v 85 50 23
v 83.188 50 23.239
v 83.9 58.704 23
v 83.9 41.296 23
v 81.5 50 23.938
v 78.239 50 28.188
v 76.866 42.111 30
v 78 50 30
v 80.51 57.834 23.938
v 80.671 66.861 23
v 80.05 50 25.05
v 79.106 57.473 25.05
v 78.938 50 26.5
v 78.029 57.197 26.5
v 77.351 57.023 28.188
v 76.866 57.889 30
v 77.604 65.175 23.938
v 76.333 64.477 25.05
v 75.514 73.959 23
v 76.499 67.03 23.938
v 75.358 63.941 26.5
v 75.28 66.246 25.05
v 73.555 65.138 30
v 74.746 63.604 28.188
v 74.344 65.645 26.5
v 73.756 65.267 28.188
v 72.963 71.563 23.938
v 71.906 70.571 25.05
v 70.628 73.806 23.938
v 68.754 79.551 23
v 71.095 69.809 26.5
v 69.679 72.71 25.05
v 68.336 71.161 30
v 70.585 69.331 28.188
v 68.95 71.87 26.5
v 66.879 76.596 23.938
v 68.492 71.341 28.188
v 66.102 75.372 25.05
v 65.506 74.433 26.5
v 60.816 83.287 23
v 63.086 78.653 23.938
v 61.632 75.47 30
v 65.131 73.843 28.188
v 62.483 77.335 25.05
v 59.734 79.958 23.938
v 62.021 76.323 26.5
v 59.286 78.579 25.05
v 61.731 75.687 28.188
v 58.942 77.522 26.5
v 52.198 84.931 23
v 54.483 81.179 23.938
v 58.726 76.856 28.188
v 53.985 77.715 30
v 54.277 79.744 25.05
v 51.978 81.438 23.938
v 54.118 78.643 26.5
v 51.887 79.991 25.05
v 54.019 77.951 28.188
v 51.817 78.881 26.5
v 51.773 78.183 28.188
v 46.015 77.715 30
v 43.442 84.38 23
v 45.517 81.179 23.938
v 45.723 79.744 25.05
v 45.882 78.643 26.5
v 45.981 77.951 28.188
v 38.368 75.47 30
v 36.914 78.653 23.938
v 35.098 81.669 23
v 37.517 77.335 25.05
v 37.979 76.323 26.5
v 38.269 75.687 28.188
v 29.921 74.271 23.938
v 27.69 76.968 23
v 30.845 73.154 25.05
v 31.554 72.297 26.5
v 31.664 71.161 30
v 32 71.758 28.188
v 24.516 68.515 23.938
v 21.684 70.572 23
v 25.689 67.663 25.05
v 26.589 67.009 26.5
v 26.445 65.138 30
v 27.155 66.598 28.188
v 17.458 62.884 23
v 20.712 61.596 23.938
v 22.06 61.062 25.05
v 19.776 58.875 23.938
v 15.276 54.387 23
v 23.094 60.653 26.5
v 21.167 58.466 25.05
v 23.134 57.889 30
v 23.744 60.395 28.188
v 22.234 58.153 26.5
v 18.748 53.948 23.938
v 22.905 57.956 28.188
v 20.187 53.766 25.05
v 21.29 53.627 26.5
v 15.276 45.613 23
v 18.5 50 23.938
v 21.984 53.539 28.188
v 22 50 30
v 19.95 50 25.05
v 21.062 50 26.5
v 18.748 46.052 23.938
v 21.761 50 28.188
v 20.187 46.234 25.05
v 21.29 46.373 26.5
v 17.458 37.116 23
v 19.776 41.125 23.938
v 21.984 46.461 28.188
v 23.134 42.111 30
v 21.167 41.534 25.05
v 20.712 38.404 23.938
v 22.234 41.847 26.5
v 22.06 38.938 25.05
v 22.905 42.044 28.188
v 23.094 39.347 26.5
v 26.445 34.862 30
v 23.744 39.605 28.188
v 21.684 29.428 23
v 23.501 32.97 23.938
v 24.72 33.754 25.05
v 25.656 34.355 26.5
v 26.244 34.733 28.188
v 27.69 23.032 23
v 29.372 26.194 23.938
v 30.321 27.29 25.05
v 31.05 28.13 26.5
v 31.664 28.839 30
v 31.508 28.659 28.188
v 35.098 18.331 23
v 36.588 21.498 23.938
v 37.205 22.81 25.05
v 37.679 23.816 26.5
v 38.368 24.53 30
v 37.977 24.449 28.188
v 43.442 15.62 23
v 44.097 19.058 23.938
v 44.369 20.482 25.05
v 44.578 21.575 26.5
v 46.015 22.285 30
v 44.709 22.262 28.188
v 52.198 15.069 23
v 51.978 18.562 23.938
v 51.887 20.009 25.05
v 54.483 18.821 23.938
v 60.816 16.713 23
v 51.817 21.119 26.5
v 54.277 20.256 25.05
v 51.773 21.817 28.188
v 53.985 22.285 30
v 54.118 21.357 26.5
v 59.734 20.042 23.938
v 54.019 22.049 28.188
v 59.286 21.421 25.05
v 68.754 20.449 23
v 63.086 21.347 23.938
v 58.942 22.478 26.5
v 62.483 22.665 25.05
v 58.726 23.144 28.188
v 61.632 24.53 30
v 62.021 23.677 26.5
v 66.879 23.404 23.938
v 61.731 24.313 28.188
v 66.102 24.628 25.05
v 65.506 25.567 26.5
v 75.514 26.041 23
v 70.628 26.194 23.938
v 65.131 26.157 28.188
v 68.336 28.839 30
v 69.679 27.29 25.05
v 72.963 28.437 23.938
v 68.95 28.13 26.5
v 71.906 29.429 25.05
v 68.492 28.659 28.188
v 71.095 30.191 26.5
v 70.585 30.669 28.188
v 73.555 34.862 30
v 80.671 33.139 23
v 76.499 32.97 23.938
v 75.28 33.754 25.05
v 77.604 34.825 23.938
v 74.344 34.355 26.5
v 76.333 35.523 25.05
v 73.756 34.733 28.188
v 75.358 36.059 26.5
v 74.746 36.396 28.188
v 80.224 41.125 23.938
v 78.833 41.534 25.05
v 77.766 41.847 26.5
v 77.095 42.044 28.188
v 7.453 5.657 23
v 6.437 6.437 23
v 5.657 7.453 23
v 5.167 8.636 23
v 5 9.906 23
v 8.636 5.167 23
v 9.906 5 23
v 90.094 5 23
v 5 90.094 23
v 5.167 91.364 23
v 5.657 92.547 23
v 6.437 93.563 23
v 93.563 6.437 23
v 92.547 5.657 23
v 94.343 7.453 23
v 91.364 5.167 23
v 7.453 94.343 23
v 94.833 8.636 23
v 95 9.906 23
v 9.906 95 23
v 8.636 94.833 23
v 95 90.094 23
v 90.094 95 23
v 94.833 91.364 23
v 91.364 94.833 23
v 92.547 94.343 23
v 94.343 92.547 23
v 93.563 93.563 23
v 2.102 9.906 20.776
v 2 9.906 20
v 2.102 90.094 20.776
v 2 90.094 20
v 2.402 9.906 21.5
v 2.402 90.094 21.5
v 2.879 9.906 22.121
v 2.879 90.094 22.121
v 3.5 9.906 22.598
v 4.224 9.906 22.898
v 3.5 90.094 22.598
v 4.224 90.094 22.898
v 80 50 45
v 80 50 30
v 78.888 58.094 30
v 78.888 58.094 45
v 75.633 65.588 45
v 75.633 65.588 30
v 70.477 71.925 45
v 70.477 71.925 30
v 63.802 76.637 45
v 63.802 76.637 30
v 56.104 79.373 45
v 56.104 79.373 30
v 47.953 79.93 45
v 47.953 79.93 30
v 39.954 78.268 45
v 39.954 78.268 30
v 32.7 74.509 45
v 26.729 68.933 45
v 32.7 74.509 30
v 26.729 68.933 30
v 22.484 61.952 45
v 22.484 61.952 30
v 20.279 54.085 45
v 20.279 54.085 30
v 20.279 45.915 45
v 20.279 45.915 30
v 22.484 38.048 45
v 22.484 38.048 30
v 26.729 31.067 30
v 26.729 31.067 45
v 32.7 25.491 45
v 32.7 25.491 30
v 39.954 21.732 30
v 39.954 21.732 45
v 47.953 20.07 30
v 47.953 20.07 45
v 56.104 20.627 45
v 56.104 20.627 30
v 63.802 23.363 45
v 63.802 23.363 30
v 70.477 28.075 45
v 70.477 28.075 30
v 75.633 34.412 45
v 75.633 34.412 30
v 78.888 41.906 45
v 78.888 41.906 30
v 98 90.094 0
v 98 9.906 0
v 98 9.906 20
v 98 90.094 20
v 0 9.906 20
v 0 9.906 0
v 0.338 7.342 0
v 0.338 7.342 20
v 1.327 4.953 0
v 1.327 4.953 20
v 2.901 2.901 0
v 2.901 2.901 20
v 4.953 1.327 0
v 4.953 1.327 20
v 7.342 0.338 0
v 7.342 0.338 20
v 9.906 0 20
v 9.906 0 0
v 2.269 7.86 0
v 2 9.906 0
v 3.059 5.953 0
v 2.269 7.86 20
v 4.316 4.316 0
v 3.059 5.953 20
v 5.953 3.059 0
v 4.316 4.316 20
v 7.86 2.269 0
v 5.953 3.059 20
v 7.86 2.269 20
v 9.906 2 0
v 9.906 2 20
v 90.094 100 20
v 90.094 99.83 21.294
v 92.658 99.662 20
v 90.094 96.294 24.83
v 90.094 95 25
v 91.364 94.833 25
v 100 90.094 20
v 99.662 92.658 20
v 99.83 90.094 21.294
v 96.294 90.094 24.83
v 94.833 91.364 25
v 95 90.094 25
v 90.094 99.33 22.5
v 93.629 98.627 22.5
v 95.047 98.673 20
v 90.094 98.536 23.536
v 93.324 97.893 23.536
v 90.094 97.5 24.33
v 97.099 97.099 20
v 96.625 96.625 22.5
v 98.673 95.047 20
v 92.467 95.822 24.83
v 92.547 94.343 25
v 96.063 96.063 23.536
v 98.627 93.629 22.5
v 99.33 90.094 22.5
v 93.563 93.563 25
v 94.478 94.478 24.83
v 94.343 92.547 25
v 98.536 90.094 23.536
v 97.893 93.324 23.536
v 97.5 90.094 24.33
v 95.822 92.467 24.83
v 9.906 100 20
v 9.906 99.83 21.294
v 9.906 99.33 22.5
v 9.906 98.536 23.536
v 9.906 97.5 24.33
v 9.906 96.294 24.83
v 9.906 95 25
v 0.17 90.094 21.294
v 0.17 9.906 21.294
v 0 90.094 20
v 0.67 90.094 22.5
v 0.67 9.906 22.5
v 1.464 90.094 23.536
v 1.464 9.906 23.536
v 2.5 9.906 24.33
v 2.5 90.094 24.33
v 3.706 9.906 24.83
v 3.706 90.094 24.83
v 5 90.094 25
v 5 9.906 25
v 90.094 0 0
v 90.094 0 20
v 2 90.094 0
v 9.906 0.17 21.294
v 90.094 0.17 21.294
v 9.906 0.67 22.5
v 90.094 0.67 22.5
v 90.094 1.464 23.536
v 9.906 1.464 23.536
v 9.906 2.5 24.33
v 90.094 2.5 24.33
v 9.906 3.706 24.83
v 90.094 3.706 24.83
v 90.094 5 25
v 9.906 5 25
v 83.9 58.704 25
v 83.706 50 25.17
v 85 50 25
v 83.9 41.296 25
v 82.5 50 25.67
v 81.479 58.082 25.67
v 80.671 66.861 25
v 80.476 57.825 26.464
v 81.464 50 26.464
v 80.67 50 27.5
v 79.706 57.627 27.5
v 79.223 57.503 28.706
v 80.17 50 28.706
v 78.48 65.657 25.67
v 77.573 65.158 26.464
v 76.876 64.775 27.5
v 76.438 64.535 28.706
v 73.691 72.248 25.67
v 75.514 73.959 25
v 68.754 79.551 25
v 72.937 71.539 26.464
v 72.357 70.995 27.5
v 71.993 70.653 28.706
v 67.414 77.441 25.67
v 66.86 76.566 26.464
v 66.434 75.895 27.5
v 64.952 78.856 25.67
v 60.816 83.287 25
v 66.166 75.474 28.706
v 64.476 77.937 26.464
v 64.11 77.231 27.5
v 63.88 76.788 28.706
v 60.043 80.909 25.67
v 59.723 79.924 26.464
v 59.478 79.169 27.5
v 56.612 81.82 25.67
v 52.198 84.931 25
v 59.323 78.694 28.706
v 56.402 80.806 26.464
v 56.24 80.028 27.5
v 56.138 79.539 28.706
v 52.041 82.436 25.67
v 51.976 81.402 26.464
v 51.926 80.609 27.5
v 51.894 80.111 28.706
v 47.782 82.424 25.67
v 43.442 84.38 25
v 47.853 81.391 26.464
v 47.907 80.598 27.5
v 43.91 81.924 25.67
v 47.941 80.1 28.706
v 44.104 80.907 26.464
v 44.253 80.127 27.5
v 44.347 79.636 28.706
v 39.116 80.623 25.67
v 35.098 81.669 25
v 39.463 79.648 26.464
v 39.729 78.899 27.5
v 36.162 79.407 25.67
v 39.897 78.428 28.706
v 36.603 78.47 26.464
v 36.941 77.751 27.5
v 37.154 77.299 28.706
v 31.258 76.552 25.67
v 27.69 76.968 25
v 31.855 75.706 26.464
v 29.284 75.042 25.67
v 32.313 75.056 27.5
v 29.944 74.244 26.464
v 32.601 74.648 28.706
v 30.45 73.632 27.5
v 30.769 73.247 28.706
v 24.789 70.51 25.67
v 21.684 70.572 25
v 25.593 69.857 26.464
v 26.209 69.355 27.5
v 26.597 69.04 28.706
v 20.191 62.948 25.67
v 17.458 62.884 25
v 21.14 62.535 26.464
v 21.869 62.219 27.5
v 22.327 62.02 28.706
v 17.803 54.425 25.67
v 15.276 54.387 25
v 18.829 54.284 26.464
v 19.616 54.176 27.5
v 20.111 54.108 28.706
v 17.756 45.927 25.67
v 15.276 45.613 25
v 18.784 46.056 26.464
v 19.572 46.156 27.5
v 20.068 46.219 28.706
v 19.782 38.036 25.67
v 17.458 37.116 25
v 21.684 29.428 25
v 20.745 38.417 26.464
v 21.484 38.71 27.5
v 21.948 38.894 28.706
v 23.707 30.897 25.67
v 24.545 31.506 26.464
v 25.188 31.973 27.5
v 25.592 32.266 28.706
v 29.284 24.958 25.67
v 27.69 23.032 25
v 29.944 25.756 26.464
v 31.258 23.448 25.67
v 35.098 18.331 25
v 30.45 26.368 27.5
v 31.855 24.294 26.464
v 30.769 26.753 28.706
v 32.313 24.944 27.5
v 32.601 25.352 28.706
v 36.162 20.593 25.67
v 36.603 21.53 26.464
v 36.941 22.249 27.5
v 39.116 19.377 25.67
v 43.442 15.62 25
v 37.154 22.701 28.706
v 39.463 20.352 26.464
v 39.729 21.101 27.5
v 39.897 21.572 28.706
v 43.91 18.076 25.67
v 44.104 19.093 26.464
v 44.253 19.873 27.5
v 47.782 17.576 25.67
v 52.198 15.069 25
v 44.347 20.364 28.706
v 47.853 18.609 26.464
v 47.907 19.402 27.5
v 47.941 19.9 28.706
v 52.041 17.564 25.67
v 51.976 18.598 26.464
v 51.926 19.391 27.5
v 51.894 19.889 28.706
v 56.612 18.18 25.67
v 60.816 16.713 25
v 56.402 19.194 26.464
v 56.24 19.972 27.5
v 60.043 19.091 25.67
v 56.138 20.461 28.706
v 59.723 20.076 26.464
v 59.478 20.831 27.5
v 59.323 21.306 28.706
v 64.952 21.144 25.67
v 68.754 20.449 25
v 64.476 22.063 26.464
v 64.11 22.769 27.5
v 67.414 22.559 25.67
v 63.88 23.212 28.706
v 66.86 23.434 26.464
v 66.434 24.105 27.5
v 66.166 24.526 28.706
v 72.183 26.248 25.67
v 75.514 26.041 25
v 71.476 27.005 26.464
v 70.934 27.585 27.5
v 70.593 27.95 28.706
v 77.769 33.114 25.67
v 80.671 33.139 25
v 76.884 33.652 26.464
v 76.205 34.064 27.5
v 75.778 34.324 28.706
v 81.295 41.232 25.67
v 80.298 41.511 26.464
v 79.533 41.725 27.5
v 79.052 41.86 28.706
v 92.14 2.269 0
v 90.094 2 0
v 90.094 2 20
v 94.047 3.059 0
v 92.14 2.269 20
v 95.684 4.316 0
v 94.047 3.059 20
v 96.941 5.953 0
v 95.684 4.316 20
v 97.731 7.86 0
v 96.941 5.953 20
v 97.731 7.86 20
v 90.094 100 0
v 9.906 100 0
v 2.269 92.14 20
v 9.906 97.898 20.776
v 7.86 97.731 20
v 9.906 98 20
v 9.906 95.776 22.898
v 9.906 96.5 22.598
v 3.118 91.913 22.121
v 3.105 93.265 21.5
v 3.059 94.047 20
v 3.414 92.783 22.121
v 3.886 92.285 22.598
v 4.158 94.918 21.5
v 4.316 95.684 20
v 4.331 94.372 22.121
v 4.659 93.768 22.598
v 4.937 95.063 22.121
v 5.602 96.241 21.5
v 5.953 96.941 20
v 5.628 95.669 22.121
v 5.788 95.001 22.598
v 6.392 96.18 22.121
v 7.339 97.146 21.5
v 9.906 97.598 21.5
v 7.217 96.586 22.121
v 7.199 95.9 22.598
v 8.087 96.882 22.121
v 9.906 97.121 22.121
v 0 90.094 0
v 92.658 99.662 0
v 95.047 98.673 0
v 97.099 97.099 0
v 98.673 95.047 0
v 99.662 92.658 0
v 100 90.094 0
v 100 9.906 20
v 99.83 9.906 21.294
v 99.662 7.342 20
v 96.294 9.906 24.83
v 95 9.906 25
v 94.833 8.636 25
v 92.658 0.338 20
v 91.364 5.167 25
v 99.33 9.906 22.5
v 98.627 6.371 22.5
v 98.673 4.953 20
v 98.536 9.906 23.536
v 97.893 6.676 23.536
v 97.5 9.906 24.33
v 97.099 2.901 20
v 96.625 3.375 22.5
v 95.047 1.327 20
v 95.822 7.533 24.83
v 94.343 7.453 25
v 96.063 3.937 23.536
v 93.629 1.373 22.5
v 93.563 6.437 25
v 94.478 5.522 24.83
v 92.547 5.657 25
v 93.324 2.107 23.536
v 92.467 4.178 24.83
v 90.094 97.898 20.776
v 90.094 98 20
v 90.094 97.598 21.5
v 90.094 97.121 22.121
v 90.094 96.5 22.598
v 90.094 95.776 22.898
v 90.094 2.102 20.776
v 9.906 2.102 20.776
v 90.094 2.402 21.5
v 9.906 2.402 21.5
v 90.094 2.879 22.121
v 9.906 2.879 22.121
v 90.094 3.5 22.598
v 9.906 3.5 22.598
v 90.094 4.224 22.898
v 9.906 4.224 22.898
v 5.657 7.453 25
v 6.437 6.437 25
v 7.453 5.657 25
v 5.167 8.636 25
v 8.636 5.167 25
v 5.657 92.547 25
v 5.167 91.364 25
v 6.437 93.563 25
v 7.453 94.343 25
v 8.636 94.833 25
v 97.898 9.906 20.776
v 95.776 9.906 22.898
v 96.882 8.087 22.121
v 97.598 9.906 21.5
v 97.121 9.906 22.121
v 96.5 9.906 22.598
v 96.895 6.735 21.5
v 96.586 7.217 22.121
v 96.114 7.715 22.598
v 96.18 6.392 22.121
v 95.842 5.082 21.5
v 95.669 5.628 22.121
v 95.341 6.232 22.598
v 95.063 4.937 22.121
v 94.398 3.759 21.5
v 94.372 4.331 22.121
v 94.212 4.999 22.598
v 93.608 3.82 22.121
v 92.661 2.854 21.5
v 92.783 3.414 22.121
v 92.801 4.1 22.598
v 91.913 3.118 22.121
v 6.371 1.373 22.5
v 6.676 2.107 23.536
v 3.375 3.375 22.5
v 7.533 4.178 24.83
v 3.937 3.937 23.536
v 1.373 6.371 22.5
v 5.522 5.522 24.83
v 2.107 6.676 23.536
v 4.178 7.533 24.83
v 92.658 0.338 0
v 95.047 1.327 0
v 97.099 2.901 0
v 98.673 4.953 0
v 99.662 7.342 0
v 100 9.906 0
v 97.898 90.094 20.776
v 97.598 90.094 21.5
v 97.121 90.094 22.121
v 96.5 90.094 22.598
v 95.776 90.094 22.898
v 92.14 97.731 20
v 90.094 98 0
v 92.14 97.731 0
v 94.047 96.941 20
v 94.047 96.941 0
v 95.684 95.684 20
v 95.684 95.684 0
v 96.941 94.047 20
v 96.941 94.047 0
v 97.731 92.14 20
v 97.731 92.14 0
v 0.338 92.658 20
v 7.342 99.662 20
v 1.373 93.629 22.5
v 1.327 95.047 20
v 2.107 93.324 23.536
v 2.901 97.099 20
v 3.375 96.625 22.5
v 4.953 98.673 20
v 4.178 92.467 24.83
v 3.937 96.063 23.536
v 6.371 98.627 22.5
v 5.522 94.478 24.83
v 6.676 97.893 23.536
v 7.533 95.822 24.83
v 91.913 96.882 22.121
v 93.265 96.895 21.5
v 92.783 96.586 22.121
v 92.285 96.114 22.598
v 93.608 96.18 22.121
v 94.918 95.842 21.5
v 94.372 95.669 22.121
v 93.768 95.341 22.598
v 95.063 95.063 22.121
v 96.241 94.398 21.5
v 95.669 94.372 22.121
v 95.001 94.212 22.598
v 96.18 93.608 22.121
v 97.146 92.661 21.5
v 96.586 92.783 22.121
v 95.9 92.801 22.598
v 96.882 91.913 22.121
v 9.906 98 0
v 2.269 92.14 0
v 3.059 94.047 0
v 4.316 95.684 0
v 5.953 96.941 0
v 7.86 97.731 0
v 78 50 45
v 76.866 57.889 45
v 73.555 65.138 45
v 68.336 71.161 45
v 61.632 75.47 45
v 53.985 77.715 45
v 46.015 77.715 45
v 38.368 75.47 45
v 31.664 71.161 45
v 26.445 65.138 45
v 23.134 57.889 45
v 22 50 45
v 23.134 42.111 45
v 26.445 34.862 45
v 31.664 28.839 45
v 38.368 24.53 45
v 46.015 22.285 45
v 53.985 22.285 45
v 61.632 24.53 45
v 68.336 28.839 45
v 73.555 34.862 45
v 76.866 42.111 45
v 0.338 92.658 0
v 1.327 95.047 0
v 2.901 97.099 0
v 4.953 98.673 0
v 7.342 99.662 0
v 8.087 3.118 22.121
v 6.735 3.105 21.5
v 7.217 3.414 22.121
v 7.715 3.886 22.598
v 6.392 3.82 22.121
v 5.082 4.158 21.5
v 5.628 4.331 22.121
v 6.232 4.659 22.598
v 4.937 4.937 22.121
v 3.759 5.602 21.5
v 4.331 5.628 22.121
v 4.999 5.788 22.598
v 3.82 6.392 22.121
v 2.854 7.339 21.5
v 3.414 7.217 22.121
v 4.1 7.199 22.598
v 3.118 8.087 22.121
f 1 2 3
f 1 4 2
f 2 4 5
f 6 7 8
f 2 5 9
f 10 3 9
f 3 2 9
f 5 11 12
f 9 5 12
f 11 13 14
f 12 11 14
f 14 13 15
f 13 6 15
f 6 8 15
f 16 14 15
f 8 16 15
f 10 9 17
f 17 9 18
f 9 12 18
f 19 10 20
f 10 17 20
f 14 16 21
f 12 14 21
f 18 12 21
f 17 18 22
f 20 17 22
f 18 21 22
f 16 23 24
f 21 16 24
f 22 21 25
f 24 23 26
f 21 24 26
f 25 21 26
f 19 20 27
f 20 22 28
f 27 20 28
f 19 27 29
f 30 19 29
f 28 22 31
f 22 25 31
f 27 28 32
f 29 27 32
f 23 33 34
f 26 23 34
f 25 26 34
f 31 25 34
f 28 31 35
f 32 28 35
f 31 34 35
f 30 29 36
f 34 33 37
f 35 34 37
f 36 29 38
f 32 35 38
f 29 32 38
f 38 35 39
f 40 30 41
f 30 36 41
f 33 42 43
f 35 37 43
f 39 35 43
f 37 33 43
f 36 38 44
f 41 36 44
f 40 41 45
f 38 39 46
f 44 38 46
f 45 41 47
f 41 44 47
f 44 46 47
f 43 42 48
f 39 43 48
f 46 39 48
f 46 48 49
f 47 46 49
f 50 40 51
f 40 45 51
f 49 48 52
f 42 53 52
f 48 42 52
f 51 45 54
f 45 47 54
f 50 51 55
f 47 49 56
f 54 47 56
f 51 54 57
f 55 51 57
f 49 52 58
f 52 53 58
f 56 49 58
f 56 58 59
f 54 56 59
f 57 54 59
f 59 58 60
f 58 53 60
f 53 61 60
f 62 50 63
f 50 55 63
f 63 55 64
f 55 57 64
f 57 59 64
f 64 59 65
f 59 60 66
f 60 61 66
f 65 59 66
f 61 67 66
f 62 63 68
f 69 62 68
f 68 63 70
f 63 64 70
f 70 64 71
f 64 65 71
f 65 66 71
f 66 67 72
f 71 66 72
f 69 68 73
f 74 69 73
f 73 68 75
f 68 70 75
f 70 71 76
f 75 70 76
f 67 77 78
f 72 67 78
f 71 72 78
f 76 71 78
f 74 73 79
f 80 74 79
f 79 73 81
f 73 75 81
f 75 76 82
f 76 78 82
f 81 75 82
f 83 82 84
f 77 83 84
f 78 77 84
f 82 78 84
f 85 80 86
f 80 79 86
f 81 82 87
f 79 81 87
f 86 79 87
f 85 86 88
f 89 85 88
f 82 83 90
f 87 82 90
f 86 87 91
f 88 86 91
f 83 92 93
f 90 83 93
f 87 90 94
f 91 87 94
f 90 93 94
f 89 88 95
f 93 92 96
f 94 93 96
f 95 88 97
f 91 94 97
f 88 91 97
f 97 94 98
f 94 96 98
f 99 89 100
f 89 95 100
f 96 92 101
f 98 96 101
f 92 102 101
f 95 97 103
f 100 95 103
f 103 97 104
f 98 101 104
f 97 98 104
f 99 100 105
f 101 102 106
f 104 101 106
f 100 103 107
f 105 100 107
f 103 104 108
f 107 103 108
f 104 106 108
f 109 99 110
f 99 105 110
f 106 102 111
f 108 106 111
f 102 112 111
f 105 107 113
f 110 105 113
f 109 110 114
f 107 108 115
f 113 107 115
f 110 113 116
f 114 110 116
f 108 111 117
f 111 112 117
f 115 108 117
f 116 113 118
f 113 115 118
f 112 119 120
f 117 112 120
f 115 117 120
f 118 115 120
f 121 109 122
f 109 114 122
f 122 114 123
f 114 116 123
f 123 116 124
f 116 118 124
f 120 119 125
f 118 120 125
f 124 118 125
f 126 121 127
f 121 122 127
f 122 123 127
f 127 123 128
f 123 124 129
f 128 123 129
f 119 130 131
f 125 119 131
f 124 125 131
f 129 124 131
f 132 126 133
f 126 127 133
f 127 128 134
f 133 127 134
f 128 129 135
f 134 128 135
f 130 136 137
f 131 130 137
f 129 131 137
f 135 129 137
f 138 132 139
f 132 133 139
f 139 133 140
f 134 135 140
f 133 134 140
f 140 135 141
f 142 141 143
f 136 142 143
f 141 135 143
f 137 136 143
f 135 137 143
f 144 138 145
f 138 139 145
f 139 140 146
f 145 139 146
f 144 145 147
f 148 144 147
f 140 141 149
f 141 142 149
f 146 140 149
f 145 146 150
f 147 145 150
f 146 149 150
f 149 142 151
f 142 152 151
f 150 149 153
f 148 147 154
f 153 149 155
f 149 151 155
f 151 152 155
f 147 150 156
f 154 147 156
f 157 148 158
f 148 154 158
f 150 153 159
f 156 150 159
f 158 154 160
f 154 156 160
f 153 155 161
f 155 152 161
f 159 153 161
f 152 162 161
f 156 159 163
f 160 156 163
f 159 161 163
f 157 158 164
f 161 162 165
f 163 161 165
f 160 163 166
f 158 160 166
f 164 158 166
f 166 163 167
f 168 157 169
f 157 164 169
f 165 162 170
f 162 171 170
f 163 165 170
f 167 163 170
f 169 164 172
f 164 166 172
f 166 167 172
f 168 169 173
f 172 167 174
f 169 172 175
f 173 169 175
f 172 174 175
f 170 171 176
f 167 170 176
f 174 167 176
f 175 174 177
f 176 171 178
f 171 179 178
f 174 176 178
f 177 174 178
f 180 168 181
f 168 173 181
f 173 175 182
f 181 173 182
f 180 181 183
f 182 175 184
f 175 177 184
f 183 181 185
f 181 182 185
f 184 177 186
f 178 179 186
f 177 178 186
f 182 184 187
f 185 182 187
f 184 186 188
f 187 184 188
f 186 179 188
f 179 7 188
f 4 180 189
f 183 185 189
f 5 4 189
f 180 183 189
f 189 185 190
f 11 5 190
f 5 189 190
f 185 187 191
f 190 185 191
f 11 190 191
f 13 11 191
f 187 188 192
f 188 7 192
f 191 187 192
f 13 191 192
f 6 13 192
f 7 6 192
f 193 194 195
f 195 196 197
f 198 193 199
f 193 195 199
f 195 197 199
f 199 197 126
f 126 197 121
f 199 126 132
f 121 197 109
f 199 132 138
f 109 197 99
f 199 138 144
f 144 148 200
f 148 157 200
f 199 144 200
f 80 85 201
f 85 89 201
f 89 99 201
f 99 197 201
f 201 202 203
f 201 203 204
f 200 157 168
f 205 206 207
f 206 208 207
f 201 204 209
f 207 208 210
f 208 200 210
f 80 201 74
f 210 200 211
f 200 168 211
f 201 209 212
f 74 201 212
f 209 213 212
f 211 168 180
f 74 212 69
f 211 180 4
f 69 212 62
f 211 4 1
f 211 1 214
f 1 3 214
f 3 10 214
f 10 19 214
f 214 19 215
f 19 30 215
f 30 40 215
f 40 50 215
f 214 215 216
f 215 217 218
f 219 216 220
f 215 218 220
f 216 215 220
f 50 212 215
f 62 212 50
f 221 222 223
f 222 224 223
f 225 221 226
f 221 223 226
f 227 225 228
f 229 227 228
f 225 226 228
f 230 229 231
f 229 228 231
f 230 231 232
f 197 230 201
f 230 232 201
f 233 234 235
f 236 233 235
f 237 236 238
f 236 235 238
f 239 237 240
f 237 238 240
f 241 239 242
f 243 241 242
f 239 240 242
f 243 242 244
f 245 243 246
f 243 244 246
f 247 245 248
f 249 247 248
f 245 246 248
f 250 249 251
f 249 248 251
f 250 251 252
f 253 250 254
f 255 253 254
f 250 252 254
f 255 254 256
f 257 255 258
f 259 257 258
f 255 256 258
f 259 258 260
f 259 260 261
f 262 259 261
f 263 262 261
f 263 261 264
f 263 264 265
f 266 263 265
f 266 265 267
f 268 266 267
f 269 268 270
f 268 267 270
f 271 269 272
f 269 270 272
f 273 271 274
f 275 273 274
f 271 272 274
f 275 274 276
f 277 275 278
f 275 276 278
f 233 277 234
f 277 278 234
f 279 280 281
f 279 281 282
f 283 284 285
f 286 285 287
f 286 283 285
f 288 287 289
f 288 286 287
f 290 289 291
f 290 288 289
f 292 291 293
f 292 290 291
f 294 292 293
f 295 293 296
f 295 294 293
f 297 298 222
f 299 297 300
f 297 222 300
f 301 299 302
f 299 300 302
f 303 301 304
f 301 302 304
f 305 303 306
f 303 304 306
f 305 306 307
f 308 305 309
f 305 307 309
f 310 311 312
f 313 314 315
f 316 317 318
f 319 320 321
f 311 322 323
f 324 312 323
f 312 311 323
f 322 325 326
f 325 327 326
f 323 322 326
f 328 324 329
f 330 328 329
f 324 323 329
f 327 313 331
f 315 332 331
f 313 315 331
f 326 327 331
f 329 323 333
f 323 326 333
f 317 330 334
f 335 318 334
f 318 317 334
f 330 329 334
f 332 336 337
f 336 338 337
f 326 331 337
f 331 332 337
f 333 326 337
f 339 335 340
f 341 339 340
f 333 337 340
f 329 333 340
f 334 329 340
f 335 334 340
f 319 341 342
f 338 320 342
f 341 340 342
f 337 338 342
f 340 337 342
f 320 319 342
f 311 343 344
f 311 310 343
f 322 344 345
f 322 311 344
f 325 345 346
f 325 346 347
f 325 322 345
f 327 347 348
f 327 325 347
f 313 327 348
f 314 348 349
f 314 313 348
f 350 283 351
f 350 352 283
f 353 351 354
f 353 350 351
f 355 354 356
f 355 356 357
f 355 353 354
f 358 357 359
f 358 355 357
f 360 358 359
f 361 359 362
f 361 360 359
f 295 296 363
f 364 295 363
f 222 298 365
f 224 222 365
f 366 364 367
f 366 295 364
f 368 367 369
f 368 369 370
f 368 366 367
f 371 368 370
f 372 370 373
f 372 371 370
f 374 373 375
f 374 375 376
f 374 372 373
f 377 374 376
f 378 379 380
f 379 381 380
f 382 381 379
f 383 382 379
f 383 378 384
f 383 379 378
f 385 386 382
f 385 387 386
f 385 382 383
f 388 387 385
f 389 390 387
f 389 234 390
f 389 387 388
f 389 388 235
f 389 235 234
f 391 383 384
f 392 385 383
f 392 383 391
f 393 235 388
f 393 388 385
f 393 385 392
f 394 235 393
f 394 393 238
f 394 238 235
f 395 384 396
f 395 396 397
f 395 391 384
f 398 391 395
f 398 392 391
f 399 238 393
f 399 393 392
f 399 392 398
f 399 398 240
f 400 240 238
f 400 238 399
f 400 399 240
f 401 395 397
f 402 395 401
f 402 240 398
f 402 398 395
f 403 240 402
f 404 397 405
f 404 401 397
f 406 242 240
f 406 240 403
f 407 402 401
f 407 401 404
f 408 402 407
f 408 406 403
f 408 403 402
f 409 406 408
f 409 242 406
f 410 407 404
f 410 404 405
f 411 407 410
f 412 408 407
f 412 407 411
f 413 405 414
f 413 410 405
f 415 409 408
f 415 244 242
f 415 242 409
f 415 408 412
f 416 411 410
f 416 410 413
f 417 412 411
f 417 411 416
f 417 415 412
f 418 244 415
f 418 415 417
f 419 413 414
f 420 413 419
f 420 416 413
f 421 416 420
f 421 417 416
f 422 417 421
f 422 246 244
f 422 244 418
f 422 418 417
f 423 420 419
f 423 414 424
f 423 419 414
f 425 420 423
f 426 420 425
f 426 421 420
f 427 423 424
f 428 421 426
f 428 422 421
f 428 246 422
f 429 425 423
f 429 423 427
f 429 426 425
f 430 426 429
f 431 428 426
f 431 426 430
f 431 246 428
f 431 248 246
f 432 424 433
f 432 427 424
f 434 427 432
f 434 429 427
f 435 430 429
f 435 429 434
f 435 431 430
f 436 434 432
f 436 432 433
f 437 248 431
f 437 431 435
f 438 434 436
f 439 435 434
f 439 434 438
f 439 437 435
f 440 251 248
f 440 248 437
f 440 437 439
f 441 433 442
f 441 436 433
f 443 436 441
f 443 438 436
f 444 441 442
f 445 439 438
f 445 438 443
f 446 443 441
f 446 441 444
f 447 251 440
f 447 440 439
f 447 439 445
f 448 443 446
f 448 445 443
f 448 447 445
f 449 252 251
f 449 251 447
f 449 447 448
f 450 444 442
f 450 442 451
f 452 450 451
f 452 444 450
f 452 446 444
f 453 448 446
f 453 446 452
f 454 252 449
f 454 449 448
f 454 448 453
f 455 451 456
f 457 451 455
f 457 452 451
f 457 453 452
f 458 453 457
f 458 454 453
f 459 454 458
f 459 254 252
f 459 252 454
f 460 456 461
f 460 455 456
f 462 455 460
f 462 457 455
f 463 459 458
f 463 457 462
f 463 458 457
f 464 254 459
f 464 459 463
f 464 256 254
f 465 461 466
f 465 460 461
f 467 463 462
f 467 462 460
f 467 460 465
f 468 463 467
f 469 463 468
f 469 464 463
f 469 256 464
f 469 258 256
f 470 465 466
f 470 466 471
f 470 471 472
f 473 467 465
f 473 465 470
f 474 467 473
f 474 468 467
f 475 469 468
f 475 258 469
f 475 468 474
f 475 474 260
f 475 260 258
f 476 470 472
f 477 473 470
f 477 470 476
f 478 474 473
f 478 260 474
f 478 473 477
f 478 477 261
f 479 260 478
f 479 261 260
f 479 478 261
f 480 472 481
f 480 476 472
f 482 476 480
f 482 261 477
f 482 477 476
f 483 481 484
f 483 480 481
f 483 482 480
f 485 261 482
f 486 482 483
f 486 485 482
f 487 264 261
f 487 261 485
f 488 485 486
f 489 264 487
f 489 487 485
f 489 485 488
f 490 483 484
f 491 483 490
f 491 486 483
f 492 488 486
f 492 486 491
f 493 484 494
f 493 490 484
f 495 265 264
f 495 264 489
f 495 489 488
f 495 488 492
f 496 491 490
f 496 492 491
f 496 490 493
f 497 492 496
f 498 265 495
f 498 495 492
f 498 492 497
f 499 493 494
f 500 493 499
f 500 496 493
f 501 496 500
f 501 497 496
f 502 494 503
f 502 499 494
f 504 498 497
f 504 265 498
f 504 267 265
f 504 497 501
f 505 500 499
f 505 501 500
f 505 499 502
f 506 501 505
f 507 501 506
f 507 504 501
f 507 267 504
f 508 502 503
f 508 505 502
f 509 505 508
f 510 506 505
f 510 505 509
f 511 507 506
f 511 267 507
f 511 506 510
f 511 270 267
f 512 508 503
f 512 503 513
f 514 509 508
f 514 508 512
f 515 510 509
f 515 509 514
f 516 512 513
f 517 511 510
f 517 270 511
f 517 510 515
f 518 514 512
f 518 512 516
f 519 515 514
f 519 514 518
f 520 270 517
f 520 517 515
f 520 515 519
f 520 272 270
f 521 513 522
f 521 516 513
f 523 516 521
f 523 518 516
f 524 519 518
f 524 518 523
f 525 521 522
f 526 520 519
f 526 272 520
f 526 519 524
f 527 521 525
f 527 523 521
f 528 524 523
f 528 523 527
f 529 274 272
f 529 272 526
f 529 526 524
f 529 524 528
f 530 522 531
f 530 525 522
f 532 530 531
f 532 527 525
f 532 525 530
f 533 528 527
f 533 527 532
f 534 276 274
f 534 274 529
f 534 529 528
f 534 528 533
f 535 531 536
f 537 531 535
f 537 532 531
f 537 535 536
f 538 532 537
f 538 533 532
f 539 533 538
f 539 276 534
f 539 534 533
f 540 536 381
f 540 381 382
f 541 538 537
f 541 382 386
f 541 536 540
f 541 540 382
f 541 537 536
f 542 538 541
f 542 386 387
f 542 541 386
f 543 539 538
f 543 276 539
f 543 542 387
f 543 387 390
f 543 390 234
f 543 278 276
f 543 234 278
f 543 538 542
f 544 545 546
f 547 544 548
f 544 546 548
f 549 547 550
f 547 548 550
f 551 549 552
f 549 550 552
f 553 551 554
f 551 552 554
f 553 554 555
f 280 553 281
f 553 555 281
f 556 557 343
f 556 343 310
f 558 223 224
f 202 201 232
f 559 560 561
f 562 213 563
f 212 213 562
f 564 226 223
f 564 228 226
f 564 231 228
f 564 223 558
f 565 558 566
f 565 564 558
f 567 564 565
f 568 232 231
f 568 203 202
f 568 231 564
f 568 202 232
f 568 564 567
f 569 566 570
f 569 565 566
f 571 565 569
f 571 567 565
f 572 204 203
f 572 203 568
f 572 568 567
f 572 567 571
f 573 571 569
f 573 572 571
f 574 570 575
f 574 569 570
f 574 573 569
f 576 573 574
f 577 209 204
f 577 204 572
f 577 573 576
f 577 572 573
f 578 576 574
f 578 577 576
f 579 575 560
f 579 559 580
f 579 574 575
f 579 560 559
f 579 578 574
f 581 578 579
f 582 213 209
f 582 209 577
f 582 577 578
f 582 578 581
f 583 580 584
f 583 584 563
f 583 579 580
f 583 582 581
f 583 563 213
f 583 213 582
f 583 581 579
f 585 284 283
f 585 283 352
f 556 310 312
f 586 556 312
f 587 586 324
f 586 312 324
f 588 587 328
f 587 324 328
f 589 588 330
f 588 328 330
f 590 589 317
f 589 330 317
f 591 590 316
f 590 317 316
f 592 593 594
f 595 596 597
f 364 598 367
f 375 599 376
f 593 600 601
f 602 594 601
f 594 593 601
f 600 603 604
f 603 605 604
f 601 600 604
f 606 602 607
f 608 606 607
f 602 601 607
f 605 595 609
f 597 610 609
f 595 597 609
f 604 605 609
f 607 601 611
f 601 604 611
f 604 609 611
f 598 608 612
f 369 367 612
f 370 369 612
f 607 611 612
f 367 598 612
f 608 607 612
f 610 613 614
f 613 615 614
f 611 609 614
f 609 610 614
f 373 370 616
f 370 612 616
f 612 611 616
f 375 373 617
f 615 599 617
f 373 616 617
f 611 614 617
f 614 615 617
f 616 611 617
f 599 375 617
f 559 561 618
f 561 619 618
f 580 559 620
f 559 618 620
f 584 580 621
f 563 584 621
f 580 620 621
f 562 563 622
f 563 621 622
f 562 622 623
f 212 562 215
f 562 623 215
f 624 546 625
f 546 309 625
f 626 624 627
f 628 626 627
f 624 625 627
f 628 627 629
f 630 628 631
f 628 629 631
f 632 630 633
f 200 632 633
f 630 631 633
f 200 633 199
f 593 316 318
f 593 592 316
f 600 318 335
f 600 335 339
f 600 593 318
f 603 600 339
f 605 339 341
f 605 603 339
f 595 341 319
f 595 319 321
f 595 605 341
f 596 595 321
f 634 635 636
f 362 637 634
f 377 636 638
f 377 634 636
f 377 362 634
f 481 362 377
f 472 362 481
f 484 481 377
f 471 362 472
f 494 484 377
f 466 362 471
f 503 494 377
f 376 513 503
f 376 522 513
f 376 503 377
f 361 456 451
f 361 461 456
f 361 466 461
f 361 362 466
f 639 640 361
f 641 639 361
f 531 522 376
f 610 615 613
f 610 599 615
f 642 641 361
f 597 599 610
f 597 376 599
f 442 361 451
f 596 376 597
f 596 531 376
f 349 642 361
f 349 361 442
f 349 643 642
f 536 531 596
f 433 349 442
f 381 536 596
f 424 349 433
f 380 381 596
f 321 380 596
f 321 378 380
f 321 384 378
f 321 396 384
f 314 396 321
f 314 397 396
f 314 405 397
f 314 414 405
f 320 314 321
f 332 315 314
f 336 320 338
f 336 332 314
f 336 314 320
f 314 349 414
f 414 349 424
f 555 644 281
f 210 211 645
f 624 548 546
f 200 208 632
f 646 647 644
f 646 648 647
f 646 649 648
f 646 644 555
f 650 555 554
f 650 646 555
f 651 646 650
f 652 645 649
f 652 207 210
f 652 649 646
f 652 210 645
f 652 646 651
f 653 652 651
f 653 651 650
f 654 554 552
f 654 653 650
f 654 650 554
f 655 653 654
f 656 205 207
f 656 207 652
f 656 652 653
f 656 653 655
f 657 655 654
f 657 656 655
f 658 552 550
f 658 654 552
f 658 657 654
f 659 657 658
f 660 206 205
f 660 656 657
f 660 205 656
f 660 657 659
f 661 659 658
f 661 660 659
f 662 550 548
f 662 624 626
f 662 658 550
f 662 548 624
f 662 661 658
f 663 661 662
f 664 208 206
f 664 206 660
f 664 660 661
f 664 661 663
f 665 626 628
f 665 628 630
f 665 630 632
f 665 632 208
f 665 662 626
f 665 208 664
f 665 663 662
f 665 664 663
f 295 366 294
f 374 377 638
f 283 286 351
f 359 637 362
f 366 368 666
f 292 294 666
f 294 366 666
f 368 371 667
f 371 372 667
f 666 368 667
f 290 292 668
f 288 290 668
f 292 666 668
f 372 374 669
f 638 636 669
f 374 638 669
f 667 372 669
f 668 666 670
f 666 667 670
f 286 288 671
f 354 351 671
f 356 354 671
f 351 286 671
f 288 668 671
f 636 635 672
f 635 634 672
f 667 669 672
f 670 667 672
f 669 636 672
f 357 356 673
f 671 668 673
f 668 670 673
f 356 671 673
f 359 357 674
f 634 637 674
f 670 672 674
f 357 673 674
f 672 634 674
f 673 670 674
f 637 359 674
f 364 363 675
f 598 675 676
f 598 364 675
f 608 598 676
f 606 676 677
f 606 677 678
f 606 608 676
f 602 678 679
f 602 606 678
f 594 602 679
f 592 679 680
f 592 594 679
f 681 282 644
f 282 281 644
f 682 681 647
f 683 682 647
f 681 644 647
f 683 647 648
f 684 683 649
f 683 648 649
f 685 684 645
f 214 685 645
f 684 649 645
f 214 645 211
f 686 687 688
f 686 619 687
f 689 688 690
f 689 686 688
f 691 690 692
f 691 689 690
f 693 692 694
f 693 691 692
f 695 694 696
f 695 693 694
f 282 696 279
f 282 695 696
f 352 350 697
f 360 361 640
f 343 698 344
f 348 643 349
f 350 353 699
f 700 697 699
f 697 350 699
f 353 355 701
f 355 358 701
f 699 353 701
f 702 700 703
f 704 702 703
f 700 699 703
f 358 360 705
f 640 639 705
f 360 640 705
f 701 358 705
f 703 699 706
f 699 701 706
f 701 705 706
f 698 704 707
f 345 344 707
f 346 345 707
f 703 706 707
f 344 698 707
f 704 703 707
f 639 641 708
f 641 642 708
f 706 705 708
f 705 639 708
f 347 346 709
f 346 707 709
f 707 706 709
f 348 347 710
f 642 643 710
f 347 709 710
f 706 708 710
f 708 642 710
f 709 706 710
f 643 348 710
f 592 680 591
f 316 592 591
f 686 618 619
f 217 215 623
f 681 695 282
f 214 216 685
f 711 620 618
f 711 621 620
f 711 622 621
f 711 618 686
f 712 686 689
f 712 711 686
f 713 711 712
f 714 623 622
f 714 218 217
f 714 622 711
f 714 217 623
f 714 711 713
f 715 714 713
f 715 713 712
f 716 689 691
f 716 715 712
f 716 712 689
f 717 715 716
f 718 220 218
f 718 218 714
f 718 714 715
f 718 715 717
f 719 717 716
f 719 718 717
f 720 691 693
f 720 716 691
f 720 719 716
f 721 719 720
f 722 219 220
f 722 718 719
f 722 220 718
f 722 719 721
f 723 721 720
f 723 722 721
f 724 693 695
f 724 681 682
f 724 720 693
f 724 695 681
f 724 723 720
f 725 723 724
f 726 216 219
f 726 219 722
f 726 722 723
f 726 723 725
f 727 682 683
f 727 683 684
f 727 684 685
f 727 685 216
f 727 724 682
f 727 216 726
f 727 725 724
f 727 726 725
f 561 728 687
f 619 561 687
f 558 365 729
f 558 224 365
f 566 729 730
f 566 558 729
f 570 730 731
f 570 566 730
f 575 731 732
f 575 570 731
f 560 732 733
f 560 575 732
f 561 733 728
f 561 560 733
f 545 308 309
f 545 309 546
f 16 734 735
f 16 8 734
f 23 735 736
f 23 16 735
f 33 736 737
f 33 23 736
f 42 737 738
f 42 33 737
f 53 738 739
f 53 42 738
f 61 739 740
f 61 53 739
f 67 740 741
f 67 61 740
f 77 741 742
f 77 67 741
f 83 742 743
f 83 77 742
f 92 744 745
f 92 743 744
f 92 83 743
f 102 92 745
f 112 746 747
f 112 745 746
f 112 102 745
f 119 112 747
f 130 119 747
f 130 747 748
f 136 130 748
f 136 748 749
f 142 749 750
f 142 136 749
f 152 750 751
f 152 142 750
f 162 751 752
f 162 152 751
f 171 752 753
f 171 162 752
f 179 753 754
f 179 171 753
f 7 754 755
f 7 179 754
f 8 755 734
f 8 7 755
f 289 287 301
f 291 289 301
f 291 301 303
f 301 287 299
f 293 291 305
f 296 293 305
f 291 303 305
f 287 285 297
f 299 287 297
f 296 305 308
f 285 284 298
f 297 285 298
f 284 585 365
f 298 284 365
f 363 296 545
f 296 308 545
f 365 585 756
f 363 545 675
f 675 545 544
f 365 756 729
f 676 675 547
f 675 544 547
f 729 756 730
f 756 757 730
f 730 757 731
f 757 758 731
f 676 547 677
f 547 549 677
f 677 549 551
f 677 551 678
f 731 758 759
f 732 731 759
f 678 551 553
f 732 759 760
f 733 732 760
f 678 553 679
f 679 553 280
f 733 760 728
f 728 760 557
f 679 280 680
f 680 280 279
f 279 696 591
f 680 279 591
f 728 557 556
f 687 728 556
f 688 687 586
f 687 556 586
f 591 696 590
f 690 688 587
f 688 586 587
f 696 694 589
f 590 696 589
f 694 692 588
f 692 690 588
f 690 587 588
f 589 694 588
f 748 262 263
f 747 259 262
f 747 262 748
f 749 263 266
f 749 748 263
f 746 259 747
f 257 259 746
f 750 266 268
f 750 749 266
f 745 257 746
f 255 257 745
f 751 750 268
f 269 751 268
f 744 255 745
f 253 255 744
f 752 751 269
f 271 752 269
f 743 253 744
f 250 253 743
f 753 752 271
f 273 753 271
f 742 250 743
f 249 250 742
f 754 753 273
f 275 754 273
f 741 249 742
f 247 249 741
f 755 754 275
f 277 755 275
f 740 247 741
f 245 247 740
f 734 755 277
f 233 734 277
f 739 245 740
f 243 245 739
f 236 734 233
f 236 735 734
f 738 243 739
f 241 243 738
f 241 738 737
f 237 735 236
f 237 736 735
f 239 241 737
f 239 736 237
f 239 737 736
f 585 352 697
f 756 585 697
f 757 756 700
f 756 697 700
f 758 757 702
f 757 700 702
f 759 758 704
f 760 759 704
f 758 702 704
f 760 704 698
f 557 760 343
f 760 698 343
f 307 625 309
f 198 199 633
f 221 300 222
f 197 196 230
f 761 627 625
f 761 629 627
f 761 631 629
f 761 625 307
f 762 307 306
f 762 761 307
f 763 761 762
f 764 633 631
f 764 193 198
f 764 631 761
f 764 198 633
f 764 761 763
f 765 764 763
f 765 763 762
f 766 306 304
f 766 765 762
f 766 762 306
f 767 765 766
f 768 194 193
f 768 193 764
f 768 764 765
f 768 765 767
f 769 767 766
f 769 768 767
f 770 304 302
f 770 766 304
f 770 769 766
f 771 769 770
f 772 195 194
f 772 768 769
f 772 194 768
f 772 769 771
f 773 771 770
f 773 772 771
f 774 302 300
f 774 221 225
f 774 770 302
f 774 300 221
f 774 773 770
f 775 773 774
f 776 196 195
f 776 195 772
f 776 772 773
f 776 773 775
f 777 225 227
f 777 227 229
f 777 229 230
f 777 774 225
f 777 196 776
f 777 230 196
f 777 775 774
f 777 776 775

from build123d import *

# Parameters (mm, degrees)
SKETCH_W     = 100
SKETCH_H     = 100
PAD_DEPTH    = 25
SKETCH001_R  = 30
PAD001_DEPTH = 20
FILLET_R     = 9.906
FILLET001_R  = 5
THICKNESS_T  = -2


with BuildPart() as part:
    # Sketch → Pad (new body)
    with BuildSketch(Plane.XY):
        with Locations((50, 50)):
            Rectangle(SKETCH_W, SKETCH_H)
    extrude(amount=PAD_DEPTH)

    # Sketch001 (on Face6 of Pad) → Pad001 (join)
    with BuildSketch(Plane.XY.offset(25)):
        with Locations((50, 50)):
            Circle(SKETCH001_R)
    extrude(amount=PAD001_DEPTH)

    # Fillet
    fillet_edges = [part.edges().sort_by_distance(p)[0] for p in [
        (0, 0, 12.5),
        (100, 0, 12.5),
        (100, 100, 12.5),
        (0, 100, 12.5),
    ]]
    fillet(fillet_edges, radius=FILLET_R)

    # Fillet001
    fillet001_edges = [part.edges().sort_by_distance(p)[0] for p in [
        (0, 50, 25),
        (2.9014, 97.0986, 25),
        (2.9014, 2.9014, 25),
        (50, 100, 25),
        (50, 0, 25),
        (97.0986, 97.0986, 25),
        (97.0986, 2.9014, 25),
        (100, 50, 25),
        (20, 50, 25),
    ]]
    fillet(fillet001_edges, radius=FILLET001_R)

    # Thickness
    thickness_openings = [part.faces().sort_by_distance(p)[0] for p in [
        (50, 50, 0),
        (50, 50, 45),
    ]]
    offset(amount=THICKNESS_T, openings=thickness_openings, kind=Kind.INTERSECTION)


solid = part.part
